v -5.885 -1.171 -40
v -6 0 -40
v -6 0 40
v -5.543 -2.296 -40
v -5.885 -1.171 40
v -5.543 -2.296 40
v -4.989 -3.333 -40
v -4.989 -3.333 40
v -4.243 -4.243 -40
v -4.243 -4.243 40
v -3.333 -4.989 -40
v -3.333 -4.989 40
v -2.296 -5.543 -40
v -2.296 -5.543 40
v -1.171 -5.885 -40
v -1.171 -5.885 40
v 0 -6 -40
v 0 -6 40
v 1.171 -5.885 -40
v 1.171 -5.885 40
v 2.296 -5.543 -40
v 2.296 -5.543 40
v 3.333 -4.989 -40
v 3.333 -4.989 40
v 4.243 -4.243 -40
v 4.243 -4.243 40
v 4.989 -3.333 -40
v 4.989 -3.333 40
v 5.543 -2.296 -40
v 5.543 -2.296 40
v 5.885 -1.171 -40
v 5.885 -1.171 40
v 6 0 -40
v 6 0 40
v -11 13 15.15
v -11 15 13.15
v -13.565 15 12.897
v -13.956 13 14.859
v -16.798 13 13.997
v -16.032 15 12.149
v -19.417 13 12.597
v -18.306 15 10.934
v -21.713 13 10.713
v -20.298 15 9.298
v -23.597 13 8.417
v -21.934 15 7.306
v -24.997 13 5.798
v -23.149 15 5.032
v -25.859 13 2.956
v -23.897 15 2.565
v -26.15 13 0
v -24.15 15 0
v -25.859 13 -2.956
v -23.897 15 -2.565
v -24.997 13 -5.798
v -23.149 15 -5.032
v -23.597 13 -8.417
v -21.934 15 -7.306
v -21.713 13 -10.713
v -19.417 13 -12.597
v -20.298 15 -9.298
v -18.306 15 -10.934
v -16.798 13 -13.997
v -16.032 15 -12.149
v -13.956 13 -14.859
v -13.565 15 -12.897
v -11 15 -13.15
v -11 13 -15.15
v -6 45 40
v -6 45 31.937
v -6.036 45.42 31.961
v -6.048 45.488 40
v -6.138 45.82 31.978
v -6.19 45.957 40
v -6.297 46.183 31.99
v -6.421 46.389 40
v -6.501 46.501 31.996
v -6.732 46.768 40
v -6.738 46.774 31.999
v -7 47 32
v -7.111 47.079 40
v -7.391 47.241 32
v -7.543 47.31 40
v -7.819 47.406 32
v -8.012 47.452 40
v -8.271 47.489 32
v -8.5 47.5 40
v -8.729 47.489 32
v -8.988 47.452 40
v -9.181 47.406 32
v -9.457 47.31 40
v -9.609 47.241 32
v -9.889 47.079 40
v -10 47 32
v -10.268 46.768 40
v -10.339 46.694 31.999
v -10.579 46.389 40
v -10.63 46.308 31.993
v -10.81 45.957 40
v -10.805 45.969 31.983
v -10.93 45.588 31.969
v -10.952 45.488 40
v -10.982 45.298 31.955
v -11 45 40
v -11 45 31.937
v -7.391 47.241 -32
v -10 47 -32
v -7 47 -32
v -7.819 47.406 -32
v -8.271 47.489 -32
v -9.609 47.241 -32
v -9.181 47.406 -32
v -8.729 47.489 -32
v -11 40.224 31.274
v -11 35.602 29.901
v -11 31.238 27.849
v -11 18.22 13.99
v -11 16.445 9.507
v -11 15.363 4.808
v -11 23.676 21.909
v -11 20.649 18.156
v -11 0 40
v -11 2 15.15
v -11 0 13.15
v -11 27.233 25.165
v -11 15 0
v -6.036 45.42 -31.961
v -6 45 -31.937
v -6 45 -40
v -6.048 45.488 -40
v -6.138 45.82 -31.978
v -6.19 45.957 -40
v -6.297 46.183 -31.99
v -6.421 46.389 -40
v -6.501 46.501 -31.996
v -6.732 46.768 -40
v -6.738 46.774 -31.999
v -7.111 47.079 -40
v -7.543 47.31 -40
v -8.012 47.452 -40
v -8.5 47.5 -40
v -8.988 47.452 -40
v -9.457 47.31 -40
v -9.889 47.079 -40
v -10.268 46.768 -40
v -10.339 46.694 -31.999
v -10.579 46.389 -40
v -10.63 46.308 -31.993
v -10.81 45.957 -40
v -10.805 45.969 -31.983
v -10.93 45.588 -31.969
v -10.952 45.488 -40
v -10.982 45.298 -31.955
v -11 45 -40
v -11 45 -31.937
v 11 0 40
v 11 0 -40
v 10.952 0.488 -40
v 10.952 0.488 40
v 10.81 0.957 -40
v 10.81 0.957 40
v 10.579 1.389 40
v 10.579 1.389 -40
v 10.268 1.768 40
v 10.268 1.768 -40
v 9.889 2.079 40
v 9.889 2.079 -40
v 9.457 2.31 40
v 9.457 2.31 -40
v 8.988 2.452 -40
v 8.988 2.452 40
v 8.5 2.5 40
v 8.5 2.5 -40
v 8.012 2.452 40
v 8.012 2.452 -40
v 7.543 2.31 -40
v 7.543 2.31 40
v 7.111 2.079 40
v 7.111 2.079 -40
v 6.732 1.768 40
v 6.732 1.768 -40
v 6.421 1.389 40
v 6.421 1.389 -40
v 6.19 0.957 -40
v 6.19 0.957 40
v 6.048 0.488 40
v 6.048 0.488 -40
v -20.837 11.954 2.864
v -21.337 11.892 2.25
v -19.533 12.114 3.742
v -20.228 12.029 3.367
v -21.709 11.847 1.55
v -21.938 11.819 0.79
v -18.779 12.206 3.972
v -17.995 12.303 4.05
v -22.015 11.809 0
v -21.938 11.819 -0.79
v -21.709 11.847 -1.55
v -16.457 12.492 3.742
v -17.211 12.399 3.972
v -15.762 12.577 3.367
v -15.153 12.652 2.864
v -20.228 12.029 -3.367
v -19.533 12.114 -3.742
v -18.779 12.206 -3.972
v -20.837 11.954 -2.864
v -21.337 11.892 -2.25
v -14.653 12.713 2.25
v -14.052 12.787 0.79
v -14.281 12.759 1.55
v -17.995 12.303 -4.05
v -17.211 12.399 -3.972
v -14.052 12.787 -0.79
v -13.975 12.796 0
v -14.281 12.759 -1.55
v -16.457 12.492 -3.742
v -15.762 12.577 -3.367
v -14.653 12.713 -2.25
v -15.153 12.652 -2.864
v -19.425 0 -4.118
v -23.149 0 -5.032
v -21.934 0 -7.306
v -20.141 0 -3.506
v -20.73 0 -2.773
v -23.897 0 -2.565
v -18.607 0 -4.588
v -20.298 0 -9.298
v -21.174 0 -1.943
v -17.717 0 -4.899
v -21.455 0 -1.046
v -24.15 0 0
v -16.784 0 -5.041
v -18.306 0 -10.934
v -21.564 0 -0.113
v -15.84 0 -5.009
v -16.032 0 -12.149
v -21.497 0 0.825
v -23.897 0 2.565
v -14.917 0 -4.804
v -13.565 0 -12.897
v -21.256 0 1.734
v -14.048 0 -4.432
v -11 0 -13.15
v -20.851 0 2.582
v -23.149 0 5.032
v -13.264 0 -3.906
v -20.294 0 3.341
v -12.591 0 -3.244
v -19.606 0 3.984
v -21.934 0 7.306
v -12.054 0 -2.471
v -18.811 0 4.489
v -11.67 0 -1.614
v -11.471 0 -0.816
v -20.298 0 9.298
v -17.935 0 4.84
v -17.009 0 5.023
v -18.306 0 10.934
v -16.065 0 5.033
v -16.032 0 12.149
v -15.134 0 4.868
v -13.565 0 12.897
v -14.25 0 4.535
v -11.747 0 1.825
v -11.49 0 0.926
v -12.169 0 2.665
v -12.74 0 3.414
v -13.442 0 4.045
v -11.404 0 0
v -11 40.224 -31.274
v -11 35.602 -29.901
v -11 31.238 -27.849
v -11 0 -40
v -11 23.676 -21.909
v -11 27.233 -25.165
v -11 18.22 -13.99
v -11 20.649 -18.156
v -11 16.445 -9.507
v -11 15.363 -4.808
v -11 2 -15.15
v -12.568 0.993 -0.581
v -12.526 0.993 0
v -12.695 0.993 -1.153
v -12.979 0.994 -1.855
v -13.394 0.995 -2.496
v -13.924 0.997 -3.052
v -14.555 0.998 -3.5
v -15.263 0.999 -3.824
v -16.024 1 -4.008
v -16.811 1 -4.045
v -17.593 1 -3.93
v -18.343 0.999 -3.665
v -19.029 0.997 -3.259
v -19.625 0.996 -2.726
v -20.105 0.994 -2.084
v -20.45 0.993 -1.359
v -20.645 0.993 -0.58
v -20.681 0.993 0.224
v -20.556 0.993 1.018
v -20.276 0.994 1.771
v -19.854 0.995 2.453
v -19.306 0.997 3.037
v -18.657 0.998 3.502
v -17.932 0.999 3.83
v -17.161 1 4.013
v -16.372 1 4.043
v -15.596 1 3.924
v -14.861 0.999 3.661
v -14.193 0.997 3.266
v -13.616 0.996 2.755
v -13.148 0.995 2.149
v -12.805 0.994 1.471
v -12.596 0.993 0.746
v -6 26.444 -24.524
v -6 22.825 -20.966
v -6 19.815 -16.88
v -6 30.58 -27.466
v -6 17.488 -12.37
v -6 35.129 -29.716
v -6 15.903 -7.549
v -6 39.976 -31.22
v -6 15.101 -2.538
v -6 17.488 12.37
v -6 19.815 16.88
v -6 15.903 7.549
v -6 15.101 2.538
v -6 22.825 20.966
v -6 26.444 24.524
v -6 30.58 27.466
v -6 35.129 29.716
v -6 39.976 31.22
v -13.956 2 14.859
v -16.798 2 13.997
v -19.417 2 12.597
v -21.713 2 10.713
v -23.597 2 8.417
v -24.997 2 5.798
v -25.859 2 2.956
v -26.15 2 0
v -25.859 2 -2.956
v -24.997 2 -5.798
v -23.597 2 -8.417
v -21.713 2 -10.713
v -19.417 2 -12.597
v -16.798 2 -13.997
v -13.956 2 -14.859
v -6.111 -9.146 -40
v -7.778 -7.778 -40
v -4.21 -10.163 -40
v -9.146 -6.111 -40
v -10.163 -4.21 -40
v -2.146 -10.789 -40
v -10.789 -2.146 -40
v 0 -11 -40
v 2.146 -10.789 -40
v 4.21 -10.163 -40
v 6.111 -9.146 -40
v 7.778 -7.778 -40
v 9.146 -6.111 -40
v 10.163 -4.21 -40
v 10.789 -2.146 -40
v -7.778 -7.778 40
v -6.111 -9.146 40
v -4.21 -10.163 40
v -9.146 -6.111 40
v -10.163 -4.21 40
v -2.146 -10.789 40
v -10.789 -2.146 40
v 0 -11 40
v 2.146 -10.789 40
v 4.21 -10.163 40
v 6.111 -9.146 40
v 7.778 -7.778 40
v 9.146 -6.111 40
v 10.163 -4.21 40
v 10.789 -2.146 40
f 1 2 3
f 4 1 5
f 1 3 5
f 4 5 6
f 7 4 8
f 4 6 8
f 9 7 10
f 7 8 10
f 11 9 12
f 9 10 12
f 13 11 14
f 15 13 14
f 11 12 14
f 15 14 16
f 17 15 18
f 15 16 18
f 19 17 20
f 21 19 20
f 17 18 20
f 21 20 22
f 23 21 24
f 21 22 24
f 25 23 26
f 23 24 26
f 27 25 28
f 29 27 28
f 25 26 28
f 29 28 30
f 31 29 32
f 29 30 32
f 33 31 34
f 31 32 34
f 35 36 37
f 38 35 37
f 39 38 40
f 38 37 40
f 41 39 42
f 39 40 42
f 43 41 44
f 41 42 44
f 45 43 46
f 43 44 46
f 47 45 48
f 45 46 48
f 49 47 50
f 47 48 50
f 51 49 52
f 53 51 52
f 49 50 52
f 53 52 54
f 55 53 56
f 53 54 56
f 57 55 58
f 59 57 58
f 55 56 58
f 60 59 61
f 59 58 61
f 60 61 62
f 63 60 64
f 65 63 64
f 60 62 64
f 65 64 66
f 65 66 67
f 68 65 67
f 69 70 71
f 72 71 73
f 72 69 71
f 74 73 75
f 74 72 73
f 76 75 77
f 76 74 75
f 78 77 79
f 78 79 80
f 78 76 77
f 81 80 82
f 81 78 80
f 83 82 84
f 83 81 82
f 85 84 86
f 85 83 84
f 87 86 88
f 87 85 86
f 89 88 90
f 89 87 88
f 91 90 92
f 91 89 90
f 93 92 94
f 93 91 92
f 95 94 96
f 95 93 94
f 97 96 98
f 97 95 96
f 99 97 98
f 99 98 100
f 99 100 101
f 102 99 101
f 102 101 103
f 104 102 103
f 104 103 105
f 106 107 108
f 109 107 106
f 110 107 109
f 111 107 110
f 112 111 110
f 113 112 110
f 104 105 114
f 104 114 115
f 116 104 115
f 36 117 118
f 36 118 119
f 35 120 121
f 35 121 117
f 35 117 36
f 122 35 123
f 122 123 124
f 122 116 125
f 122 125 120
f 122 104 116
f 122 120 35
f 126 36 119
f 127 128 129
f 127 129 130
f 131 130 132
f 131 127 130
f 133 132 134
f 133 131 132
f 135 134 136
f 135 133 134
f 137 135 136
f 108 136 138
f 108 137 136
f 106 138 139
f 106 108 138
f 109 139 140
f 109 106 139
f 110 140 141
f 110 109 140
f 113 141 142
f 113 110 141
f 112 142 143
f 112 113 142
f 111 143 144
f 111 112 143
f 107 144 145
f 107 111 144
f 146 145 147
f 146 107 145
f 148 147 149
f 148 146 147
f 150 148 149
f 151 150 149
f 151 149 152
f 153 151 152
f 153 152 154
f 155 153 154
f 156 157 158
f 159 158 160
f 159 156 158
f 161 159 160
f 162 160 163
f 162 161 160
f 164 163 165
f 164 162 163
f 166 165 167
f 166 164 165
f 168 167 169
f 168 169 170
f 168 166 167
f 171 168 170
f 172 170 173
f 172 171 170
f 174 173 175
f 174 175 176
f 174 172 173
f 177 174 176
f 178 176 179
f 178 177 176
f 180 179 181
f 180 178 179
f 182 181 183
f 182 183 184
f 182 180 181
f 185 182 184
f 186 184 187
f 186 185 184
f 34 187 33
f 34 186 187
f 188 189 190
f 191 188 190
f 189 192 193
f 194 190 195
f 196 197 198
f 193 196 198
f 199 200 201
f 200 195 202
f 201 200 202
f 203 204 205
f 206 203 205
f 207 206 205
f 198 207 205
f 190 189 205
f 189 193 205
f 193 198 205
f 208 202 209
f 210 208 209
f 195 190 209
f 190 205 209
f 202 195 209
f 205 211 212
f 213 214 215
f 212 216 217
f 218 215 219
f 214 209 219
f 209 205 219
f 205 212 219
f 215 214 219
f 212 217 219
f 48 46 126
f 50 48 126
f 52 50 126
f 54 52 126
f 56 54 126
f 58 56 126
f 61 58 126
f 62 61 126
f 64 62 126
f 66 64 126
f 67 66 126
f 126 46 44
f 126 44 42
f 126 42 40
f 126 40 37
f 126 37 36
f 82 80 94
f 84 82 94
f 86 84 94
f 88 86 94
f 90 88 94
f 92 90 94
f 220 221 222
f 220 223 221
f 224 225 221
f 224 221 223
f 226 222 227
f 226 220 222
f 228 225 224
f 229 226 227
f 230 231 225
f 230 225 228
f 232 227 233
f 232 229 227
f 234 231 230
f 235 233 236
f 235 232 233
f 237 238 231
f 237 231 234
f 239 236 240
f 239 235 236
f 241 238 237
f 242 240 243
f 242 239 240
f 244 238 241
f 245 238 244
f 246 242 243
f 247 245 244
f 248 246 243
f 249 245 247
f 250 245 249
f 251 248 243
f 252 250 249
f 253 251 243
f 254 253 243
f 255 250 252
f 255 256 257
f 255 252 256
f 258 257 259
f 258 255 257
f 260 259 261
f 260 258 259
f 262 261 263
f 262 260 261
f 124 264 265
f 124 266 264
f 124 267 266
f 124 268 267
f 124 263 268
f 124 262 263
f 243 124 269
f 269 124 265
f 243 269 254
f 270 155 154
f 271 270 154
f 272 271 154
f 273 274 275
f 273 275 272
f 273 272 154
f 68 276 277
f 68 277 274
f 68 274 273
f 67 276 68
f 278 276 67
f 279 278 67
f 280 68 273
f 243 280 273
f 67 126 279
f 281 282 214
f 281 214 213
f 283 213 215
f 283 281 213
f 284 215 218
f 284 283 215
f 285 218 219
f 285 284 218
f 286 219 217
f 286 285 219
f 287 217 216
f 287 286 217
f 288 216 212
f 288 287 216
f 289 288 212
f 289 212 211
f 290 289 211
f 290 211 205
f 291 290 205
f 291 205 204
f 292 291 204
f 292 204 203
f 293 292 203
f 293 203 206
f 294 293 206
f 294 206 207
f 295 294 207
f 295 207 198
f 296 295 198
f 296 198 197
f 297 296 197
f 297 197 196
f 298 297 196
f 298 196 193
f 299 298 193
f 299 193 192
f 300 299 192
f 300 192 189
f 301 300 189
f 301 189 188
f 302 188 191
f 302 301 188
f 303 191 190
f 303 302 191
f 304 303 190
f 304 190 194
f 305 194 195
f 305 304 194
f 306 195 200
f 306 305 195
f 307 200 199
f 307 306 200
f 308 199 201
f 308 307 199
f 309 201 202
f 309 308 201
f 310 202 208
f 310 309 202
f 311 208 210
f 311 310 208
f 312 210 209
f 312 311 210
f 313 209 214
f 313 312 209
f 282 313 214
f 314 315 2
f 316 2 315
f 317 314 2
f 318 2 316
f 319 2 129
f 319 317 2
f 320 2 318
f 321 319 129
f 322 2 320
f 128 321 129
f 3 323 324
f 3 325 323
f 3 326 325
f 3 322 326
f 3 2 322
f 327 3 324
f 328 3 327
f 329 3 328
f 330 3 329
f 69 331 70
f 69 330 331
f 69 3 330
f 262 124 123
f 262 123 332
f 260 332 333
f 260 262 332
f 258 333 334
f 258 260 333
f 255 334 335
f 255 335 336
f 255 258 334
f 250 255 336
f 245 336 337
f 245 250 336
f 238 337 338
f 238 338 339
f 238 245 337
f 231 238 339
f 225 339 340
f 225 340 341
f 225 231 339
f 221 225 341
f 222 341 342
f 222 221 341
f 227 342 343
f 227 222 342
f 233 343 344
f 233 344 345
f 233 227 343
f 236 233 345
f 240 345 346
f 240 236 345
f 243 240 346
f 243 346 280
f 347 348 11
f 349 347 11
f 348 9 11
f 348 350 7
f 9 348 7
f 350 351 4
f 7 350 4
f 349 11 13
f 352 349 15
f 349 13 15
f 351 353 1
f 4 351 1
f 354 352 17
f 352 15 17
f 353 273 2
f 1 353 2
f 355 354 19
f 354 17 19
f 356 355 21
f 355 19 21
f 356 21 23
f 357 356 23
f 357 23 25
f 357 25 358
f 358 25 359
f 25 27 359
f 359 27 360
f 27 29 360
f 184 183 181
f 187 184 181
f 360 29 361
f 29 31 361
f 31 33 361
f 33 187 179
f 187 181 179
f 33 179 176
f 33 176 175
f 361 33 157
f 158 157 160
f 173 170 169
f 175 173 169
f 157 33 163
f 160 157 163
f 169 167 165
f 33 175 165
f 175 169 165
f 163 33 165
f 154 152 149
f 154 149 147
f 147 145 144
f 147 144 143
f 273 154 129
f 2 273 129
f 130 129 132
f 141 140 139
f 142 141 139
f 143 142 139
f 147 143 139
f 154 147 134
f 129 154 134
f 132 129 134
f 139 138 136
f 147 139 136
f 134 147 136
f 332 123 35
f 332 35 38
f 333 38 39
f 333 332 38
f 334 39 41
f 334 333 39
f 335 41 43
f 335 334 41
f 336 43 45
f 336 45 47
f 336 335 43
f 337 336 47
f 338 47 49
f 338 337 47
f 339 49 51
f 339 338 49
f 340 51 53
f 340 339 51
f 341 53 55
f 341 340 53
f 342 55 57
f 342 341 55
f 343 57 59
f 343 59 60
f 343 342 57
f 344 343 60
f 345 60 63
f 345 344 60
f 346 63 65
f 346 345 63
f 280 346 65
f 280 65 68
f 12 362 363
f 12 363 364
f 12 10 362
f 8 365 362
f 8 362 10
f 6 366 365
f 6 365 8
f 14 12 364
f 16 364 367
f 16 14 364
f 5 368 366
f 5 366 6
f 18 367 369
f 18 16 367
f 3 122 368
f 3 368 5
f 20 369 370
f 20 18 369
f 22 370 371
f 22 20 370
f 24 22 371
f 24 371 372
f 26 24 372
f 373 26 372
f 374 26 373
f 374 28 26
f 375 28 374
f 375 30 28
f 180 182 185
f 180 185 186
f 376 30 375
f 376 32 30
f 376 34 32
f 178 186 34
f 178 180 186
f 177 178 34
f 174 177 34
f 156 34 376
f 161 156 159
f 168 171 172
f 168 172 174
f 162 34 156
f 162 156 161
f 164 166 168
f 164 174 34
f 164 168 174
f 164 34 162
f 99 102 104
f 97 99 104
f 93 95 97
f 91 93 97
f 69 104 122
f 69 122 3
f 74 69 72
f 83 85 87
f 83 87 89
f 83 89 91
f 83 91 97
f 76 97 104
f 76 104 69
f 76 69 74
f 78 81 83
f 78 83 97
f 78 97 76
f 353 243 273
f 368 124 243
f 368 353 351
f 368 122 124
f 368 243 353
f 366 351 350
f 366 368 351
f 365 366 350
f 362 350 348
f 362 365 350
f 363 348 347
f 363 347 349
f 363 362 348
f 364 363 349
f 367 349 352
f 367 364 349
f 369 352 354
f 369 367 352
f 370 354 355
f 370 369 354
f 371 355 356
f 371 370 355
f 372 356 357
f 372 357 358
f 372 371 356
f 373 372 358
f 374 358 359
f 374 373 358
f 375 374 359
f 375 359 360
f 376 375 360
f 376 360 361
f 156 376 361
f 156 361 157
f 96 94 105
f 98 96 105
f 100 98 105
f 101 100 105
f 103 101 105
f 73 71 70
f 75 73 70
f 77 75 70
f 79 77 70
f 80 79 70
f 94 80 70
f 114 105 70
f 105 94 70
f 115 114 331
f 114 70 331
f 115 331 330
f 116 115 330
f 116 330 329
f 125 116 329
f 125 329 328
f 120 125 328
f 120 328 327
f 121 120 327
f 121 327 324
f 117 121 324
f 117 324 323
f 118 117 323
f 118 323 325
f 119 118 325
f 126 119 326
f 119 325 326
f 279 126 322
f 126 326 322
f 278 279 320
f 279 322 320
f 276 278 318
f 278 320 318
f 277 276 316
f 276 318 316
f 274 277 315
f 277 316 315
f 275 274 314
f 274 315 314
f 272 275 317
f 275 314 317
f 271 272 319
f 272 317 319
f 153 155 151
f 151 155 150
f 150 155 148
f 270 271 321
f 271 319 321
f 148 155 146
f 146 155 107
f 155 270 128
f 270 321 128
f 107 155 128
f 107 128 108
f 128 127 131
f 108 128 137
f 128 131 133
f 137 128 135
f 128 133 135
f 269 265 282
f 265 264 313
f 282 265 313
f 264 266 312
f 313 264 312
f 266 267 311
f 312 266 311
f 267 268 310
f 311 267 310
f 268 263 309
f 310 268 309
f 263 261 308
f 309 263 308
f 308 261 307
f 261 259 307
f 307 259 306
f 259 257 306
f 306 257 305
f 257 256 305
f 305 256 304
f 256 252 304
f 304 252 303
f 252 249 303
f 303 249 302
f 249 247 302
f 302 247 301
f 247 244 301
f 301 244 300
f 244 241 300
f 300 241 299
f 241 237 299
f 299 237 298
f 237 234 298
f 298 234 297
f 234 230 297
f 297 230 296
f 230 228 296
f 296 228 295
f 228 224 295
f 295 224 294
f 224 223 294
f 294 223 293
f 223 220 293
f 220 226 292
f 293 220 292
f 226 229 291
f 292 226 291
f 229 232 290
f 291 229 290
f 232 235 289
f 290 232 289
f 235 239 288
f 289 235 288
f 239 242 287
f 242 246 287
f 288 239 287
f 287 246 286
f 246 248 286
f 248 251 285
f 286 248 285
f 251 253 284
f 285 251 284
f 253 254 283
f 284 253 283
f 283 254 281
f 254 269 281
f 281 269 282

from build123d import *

# Parameters (mm, degrees)
PAD_DEPTH       = 40
PAD001_DEPTH    = 15
POCKET_DEPTH    = 20.151
SKETCH003_R     = 4.05
POCKET001_DEPTH = 14
CHAMFER_SIZE    = 2
CHAMFER001_SIZE = 2
CHAMFER002_SIZE = 1


with BuildPart() as part:
    # Sketch → Pad (new body, symmetric)
    with BuildSketch(Plane.XY):
        with BuildLine():
            Line((-11, 45), (-11, 0))
            ThreePointArc((-11, 0), (0, -11), (11, 0))
            ThreePointArc((11, 0), (8.5, 2.5), (6, 0))
            ThreePointArc((-6, 0), (0, -6), (6, 0))
            Line((-6, 0), (-6, 45))
            ThreePointArc((-6, 45), (-8.5, 47.5), (-11, 45))
        make_face()
    extrude(amount=PAD_DEPTH, both=True)

    # Sketch001 → Pad001 (join)
    with BuildSketch(Plane.XZ):
        with BuildLine():
            ThreePointArc((-11, 15.15), (-26.15, 0), (-11, -15.15))
            Line((-11, 15.15), (-11, -15.15))
        make_face()
    extrude(amount=-PAD001_DEPTH)

    # Sketch002 (on Face1 of Pad001) → Pocket (cut, through all)
    with BuildSketch(Plane.YZ.offset(-6)):
        with BuildLine():
            Line((108.94, 32), (47, 32))
            ThreePointArc((47, 32), (15, 0), (47, -32))
            Line((47, -32), (108.94, -32))
            Line((108.94, -32), (108.94, 32))
        make_face()
    extrude(amount=-POCKET_DEPTH, mode=Mode.SUBTRACT)

    # Sketch003 (on DatumPlane) → Pocket001 (cut)
    with BuildSketch(Plane(origin=(-3.316026, 0, 0), x_dir=(0.992546, 0.121869, 0), z_dir=(-0.121869, 0.992546, 0))):
        with Locations((-13.070263, 0)):
            Circle(SKETCH003_R)
    extrude(amount=POCKET001_DEPTH, mode=Mode.SUBTRACT)

    # Chamfer
    chamfer_edges = [part.edges().sort_by_distance(p)[0] for p in [
        (-21.712668, 15, -10.712668),
    ]]
    chamfer(chamfer_edges, length=CHAMFER_SIZE)

    # Chamfer001
    chamfer001_edges = [part.edges().sort_by_distance(p)[0] for p in [
        (-26.15, 0, 0),
    ]]
    chamfer(chamfer001_edges, length=CHAMFER001_SIZE)

    # Chamfer002
    chamfer002_edges = [part.edges().sort_by_distance(p)[0] for p in [
        (-20.564859, 0, 0),
    ]]
    chamfer(chamfer002_edges, length=CHAMFER002_SIZE)


solid = part.part
